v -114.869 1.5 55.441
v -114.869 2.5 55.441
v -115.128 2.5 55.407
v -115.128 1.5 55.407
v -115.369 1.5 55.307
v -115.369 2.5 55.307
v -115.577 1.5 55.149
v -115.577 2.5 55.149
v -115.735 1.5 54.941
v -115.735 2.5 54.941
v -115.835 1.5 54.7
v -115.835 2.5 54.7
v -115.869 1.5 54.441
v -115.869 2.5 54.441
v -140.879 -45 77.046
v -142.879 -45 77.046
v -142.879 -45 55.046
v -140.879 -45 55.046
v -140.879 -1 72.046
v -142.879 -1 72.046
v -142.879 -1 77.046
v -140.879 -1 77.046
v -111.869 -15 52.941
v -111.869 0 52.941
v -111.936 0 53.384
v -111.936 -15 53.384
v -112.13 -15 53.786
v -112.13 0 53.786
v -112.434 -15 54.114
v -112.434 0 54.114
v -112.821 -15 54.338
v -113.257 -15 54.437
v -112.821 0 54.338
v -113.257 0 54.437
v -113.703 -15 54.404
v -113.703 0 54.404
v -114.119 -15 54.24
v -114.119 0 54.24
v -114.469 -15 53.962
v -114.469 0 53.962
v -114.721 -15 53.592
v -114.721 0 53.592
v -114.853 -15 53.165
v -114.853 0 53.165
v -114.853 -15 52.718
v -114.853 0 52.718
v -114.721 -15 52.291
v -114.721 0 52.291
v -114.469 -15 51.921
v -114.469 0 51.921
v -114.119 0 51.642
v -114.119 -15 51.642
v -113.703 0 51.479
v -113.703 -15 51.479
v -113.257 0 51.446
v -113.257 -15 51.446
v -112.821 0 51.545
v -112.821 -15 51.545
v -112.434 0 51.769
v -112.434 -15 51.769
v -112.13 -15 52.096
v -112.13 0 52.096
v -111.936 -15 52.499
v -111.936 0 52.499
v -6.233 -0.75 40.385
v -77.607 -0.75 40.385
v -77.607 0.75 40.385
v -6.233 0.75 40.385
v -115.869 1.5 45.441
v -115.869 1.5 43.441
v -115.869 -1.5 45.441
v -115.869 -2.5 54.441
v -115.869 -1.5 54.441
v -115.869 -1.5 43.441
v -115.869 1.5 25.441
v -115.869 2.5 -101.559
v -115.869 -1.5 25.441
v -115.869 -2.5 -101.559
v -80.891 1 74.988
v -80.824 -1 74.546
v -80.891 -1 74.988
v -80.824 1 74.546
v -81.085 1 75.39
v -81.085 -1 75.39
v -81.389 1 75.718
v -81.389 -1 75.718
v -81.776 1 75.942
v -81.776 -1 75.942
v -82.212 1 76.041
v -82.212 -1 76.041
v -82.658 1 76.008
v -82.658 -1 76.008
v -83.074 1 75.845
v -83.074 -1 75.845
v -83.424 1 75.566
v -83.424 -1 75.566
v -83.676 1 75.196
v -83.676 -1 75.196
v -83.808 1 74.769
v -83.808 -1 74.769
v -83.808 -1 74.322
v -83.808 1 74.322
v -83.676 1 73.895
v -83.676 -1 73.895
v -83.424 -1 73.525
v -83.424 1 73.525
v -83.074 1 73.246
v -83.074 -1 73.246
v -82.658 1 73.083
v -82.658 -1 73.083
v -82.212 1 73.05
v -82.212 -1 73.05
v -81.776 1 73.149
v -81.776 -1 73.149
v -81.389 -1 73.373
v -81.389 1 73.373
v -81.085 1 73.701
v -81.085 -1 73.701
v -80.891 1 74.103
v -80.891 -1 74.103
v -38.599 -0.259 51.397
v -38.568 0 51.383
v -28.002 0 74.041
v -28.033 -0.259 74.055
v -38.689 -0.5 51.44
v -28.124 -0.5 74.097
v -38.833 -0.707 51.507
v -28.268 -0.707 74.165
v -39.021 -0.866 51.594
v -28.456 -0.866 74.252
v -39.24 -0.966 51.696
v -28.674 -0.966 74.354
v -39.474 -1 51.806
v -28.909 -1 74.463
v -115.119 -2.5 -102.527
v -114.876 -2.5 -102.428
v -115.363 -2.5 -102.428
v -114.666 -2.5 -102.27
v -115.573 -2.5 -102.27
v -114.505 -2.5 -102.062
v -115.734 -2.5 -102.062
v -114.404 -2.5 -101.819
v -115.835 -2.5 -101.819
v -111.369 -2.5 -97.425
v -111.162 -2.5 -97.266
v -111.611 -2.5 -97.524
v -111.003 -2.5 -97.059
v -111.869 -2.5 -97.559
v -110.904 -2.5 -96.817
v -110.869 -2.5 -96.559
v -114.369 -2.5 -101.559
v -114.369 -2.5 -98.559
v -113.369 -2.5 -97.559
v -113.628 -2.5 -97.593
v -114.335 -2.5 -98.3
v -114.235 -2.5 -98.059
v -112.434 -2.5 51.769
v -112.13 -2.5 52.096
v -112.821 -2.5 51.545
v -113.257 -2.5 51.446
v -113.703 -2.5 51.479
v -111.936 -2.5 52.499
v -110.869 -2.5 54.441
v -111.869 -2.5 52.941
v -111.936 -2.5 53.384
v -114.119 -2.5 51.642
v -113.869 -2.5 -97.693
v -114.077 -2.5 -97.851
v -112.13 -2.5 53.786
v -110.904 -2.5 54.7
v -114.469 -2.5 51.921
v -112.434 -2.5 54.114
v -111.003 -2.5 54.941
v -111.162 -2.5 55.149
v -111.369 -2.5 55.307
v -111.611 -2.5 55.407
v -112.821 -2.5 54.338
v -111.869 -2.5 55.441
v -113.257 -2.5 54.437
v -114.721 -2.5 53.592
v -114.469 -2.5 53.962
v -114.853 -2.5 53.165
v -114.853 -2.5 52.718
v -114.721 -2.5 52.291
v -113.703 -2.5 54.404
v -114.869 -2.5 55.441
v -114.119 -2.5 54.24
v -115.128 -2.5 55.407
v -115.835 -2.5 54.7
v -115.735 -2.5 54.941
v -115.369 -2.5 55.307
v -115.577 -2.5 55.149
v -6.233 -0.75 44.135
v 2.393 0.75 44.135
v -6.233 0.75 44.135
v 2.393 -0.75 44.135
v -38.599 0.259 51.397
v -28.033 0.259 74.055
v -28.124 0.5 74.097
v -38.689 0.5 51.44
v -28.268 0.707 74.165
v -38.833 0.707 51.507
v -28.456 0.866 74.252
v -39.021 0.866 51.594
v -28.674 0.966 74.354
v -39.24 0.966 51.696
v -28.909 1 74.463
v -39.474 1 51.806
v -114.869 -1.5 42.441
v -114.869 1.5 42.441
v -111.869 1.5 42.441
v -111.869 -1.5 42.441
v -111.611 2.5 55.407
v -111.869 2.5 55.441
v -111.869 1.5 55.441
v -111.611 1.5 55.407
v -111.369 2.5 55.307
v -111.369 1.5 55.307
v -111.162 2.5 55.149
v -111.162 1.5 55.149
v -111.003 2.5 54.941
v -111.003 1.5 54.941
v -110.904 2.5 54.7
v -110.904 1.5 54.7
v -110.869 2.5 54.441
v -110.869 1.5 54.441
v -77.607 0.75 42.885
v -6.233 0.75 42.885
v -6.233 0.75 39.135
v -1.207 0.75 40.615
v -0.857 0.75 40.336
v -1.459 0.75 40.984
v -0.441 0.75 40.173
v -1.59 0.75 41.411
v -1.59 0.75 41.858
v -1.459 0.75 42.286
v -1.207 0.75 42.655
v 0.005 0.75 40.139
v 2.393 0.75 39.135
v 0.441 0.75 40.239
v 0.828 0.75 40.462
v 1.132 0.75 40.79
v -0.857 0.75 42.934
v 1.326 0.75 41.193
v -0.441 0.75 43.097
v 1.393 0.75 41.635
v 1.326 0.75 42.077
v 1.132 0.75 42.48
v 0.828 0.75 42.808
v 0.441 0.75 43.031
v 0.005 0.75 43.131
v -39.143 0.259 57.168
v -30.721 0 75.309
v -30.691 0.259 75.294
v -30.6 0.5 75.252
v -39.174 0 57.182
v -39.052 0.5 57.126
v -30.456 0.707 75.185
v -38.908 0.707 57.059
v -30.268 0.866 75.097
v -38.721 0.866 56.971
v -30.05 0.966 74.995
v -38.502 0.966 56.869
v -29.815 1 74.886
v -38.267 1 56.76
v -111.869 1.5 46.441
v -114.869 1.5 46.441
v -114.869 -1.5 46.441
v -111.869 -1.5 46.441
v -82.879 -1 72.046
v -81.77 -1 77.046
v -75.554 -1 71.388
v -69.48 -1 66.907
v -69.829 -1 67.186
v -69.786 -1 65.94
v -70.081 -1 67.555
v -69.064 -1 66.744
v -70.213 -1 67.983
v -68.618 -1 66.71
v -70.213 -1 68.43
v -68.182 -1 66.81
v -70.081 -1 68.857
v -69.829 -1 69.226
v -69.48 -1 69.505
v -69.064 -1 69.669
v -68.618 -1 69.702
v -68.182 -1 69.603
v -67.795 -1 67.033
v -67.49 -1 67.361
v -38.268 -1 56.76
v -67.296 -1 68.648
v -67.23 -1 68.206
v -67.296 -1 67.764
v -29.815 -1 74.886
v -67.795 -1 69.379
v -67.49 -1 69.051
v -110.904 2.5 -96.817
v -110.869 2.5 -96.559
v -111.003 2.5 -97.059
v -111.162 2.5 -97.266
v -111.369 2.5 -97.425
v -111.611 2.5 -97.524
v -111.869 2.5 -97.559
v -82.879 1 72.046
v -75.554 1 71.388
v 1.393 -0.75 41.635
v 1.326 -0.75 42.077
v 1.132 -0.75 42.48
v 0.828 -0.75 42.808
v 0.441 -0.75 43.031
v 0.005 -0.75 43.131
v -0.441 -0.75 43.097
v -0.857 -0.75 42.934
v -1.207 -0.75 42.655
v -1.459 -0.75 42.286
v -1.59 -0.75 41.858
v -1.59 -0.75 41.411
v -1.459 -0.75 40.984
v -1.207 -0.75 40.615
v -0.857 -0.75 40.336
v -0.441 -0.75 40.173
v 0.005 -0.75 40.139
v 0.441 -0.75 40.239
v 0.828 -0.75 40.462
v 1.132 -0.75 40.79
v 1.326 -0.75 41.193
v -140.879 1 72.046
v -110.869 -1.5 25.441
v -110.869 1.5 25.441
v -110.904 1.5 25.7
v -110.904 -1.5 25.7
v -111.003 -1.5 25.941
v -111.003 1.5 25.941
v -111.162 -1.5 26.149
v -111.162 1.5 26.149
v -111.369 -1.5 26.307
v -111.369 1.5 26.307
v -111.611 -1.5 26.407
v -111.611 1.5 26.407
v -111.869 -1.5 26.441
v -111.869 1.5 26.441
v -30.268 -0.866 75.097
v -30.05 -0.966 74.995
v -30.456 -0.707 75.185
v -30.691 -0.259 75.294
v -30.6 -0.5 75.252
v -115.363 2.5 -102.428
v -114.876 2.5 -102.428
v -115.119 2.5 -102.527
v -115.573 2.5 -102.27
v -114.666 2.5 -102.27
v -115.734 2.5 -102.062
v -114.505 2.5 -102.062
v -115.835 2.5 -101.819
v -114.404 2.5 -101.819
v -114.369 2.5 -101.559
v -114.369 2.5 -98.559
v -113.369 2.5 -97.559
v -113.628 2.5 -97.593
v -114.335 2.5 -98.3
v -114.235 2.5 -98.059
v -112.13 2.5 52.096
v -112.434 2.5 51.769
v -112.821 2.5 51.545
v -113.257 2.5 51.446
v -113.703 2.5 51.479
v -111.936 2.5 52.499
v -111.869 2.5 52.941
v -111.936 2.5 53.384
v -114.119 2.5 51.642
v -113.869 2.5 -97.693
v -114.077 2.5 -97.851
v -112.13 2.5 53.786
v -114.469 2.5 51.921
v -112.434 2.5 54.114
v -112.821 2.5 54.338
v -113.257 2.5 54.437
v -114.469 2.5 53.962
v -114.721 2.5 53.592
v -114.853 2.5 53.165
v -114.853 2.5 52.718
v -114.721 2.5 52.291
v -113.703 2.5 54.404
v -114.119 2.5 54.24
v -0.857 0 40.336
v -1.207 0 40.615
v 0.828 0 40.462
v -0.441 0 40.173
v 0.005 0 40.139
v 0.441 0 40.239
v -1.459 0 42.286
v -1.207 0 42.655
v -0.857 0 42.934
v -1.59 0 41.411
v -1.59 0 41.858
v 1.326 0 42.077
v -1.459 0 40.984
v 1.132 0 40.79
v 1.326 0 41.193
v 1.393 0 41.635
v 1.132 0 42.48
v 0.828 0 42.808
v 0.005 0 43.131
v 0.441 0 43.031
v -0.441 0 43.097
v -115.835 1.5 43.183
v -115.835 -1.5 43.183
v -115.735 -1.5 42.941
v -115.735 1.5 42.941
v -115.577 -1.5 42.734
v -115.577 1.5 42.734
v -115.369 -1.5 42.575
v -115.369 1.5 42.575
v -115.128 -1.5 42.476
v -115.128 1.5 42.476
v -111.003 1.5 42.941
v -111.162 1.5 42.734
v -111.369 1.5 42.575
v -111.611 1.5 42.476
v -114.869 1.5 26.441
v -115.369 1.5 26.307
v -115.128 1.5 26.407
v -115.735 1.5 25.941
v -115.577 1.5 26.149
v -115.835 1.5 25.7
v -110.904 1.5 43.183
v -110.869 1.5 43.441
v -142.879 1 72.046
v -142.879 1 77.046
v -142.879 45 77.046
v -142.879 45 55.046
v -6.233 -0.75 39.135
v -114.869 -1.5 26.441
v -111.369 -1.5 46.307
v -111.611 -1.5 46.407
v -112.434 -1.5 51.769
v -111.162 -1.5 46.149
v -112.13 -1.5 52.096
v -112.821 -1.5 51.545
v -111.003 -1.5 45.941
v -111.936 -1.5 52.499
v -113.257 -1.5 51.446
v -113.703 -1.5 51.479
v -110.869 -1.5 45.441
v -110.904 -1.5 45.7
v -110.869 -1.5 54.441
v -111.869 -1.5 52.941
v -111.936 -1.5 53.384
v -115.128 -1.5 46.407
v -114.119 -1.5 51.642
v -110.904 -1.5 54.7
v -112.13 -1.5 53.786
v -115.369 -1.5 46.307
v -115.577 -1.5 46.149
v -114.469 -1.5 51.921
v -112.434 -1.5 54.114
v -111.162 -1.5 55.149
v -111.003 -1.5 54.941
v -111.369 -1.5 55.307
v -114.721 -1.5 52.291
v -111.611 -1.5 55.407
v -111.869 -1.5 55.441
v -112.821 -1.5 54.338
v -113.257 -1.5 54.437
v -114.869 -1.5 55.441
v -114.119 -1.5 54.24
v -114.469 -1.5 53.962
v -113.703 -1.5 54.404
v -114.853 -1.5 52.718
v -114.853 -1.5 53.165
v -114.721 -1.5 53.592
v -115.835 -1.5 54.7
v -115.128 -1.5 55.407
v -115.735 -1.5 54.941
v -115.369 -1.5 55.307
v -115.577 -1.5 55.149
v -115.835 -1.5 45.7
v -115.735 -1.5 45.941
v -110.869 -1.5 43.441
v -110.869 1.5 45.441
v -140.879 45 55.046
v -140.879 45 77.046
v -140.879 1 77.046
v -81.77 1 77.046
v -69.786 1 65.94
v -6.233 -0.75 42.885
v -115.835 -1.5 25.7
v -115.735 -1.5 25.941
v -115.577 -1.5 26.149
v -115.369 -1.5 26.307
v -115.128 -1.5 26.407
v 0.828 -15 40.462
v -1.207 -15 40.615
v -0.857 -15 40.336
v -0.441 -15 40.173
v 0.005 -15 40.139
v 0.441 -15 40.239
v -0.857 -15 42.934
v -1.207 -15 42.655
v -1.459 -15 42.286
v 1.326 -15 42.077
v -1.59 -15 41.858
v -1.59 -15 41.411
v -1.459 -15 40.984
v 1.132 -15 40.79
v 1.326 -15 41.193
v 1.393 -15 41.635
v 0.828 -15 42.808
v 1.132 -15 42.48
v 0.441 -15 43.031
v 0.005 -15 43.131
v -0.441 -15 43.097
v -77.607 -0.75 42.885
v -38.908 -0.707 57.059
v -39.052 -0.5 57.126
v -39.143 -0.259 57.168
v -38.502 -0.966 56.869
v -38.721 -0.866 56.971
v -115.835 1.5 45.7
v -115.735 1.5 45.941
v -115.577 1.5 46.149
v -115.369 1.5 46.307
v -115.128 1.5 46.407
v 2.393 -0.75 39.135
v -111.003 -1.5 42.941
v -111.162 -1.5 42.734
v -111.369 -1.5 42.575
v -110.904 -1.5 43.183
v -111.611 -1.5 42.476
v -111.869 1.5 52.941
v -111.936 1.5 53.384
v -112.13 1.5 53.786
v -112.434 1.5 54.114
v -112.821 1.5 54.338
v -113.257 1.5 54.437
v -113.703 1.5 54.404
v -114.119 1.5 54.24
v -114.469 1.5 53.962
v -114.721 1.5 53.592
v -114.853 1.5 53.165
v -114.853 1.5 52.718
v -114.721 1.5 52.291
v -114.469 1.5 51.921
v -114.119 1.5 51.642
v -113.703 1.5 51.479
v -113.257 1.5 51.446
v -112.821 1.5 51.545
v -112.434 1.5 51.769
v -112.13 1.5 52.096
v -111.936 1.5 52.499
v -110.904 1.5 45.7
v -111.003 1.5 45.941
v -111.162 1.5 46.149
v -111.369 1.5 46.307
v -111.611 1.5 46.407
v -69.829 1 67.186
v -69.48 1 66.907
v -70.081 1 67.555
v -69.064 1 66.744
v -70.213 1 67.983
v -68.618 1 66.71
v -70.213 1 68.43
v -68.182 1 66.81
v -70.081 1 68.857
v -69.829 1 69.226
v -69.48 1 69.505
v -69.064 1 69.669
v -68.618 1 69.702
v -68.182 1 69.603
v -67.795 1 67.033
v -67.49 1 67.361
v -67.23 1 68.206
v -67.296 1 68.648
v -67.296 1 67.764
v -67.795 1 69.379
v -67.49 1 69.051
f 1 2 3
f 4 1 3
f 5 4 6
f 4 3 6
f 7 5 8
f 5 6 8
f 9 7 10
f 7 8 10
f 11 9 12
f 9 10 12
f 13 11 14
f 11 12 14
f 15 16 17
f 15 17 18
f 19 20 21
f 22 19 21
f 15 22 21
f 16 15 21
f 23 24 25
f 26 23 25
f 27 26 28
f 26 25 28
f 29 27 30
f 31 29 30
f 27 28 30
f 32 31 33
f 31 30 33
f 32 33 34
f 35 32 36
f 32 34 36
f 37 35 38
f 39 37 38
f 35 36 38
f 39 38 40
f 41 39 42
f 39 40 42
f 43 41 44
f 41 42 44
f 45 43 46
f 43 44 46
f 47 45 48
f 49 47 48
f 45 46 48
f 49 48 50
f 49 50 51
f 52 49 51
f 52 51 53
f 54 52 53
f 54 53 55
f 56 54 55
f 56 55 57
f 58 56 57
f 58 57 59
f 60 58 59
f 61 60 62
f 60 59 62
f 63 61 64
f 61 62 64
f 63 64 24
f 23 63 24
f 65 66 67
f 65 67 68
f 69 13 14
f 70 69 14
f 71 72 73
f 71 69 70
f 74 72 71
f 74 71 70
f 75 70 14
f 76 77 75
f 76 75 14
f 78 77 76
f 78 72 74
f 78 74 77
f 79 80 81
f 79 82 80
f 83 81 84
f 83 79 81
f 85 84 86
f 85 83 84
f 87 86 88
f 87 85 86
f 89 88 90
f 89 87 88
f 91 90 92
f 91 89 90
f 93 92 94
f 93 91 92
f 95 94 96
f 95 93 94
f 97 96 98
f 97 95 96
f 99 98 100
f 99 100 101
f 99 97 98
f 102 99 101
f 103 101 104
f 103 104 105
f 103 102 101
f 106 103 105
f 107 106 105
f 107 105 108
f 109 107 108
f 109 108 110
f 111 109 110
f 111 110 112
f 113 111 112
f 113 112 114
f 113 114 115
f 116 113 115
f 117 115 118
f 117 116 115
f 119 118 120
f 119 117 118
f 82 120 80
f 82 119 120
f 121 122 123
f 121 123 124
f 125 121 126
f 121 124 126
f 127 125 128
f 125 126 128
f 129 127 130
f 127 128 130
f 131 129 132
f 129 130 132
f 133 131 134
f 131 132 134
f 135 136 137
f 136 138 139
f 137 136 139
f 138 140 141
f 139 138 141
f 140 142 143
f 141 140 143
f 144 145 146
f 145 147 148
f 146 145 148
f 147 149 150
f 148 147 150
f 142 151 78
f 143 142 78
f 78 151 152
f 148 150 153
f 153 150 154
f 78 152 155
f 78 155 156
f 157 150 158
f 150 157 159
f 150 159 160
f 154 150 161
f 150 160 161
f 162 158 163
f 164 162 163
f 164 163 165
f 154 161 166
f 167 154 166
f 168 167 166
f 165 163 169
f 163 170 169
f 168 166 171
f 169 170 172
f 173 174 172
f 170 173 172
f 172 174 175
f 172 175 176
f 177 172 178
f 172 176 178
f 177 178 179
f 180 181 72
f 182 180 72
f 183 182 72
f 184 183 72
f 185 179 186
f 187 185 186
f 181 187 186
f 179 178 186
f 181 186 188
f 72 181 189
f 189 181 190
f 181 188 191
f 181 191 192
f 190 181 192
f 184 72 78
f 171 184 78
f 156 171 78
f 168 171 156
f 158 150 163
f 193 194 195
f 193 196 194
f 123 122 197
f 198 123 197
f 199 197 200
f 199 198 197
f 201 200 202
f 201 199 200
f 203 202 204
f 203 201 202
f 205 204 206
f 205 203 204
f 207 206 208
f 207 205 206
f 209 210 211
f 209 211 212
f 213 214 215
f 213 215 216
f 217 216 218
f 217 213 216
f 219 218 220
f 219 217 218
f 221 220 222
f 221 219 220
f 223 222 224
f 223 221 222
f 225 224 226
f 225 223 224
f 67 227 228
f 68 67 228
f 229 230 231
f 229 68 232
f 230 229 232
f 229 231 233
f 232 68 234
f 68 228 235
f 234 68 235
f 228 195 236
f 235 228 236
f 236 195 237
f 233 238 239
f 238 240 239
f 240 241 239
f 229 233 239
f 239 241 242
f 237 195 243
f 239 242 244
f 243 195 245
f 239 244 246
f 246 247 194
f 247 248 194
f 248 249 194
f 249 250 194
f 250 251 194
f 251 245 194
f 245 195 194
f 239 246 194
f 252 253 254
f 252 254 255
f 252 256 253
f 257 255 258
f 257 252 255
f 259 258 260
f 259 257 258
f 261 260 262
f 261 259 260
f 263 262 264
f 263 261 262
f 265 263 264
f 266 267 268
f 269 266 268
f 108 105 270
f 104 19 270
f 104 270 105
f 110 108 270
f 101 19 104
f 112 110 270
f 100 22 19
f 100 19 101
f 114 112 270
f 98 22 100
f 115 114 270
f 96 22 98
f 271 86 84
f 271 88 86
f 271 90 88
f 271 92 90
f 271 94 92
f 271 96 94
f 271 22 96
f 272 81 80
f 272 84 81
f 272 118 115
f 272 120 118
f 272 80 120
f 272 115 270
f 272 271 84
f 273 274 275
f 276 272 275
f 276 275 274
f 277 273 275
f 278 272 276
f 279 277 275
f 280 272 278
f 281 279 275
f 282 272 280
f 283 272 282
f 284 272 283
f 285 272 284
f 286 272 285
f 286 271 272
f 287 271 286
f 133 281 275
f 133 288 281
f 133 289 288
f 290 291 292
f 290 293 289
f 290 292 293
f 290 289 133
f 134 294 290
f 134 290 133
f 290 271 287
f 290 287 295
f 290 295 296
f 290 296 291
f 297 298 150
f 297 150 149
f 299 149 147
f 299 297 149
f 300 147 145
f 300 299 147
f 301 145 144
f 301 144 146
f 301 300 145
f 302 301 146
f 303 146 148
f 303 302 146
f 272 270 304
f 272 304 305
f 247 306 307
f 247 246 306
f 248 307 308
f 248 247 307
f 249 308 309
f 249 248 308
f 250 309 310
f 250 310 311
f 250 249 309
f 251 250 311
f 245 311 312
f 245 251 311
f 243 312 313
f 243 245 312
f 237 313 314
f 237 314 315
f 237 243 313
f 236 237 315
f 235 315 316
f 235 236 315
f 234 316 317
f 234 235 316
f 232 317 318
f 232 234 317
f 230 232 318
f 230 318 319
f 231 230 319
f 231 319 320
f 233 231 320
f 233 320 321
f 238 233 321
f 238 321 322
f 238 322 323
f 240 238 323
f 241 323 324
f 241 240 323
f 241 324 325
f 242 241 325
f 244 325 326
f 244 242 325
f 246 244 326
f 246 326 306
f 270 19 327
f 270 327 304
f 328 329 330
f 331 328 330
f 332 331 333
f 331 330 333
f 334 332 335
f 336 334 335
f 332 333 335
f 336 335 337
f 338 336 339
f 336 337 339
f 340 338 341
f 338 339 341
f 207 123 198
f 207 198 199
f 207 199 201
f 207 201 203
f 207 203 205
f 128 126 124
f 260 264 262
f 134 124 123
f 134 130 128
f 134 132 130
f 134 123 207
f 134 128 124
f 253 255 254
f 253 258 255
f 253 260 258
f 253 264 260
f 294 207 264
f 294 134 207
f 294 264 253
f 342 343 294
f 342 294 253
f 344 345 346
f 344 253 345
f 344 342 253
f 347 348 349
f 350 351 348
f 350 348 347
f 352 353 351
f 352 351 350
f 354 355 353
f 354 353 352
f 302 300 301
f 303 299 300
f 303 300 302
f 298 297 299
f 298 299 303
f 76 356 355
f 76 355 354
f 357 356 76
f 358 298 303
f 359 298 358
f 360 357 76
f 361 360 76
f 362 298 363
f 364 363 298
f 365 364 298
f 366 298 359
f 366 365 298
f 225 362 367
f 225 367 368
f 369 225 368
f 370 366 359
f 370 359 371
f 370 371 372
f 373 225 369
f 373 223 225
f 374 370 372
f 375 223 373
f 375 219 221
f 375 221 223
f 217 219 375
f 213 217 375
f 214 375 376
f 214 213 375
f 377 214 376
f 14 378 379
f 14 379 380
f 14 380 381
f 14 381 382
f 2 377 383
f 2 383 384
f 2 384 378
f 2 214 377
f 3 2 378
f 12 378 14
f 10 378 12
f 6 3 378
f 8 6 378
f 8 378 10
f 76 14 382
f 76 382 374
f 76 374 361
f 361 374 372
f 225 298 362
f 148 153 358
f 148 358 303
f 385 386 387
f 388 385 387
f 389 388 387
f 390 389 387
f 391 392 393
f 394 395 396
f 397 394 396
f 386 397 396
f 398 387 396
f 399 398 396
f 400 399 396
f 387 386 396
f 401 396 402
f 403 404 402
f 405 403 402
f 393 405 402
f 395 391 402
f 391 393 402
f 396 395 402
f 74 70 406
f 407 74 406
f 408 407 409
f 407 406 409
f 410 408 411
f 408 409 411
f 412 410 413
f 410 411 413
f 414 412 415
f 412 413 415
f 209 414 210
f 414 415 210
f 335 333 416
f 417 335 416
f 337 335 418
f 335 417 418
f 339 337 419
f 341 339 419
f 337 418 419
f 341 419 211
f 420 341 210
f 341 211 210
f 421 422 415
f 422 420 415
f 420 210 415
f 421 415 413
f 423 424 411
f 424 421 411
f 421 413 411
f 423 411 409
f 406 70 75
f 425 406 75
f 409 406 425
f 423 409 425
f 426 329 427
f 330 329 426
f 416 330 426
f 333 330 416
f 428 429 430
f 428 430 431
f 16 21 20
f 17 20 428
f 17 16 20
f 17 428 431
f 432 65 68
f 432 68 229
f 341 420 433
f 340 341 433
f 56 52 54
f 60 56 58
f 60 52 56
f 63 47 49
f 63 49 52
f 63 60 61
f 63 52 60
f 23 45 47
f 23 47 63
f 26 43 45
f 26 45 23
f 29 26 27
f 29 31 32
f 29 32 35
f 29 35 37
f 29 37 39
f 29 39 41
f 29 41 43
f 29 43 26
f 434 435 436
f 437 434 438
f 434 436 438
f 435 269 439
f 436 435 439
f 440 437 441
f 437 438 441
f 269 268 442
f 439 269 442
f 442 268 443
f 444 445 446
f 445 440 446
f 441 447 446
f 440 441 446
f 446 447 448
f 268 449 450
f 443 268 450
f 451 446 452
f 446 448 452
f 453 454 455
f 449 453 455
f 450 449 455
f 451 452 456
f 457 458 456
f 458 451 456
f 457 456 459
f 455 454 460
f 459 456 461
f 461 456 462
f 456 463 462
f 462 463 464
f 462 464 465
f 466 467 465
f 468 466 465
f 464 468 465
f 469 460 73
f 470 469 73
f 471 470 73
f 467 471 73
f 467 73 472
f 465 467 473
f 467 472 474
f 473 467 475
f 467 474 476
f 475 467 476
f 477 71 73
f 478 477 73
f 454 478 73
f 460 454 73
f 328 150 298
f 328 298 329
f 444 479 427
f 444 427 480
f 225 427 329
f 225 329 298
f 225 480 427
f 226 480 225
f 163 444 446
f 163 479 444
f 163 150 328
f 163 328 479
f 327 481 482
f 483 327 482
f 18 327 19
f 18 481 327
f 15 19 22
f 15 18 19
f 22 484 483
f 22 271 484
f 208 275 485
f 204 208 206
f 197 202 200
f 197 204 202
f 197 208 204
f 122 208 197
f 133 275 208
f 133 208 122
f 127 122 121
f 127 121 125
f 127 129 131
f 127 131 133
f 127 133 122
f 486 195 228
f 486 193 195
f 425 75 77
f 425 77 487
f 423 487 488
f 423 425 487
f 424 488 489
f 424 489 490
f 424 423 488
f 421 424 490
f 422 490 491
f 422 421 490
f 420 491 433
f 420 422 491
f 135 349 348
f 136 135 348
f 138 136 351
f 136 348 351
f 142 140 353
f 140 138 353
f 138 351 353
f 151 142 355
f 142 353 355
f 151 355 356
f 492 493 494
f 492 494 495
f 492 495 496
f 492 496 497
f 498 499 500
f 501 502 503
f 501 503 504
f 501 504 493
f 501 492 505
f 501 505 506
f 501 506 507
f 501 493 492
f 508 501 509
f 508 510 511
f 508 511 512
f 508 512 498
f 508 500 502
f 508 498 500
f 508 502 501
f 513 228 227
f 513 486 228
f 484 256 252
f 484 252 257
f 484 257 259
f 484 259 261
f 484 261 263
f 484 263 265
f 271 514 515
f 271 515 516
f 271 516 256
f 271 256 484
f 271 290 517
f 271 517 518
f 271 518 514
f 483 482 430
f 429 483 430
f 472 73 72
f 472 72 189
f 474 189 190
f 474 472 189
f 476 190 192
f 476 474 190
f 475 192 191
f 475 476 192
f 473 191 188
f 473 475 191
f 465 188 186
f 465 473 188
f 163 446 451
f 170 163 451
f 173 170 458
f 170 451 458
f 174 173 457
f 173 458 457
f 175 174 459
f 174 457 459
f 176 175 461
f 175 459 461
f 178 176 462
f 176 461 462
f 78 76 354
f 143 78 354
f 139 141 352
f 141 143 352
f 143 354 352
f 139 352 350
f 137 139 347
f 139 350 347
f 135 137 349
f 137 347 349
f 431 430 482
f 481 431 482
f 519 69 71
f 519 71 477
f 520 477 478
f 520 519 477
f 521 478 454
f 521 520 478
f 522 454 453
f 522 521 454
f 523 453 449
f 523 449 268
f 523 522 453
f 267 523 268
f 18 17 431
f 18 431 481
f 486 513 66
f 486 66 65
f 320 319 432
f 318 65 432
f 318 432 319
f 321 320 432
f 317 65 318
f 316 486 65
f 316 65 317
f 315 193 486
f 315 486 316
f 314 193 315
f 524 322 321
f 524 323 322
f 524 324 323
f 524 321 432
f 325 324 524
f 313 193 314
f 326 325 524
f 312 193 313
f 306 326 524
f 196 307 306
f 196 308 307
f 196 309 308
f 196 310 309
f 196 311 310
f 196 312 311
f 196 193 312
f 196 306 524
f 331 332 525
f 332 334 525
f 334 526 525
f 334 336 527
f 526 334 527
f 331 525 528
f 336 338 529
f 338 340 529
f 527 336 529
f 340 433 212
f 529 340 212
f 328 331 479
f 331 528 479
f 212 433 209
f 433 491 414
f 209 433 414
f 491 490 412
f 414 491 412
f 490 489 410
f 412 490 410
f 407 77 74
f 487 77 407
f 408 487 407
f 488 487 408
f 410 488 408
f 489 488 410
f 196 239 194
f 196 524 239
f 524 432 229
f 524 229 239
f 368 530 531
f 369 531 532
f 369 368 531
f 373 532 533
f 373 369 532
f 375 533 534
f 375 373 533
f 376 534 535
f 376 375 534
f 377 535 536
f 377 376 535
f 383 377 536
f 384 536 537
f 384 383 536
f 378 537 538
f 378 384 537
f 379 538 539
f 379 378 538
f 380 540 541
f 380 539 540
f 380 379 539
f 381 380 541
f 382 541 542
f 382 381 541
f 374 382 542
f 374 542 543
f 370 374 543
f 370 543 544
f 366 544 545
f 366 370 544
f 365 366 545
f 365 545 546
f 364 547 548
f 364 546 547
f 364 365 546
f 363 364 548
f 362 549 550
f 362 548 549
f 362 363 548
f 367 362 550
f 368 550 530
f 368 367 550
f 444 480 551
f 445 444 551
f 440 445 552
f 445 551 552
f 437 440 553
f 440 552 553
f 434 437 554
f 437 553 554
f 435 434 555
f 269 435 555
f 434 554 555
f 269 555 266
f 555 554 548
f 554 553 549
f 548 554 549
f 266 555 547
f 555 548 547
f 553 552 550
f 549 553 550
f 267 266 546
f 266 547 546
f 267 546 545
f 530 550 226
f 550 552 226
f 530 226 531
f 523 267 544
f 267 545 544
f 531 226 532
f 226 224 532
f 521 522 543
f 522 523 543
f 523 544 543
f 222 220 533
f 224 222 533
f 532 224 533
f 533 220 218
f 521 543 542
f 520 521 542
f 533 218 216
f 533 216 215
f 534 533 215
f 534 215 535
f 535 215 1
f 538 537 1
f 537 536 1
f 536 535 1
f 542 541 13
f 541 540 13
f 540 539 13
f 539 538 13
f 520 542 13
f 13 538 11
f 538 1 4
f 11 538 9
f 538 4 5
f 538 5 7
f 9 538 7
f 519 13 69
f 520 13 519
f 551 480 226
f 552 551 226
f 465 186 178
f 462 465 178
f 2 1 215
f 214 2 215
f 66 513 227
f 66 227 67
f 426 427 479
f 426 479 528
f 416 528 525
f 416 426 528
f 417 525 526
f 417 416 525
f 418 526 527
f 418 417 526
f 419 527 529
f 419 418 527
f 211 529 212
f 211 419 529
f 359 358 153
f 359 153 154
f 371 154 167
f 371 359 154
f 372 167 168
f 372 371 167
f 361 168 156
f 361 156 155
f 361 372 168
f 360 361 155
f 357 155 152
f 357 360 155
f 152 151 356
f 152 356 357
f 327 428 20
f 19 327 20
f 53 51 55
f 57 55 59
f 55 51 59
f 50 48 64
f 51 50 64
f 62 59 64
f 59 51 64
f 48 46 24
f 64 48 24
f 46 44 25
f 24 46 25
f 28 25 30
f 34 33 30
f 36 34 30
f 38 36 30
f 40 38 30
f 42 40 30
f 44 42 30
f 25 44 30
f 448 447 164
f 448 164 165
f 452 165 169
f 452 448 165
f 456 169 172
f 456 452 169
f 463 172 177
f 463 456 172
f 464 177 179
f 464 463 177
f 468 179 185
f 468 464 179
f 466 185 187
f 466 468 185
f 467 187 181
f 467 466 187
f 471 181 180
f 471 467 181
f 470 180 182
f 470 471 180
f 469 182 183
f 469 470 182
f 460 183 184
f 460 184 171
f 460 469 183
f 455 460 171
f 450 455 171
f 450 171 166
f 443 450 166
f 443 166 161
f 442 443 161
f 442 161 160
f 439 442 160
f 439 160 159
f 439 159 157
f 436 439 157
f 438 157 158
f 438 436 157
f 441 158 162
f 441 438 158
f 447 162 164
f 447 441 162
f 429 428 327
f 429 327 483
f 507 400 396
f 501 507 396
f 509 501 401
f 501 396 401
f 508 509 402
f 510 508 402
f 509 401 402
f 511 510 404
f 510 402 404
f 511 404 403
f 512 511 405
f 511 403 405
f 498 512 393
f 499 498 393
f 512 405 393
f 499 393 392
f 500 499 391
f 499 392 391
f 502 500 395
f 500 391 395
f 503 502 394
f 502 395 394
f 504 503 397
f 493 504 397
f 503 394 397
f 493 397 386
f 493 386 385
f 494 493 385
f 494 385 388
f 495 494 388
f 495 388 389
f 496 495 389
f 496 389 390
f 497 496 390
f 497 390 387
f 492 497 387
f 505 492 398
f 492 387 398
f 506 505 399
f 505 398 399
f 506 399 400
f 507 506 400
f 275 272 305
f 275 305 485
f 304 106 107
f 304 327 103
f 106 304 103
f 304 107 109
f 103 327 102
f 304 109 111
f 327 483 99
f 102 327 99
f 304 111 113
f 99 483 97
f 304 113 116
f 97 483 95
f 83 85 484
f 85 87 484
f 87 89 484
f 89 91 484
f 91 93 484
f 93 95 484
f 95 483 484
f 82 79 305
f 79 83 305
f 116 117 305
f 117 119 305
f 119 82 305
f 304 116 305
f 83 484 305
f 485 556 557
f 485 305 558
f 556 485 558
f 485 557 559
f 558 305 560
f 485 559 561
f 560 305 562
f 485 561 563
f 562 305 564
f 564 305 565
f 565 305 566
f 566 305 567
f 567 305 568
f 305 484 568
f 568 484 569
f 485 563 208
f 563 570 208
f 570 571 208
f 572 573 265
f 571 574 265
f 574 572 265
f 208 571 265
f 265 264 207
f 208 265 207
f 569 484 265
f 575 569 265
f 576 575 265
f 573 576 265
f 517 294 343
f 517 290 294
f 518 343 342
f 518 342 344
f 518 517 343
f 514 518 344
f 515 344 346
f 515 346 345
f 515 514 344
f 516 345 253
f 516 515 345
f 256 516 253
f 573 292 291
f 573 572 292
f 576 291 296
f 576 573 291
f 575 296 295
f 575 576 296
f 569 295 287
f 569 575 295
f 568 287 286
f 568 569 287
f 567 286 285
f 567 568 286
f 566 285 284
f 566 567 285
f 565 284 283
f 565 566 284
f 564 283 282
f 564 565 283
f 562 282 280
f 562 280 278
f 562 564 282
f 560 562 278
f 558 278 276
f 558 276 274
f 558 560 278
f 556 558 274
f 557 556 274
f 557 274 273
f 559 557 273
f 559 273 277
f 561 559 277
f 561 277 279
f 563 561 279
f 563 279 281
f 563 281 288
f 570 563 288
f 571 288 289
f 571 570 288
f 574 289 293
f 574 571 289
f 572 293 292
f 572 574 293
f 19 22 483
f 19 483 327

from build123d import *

# Parameters (mm, degrees)
F0_R        = 1.5
F1_DEPTH    = 0.75
F0_W        = 5
F0_H        = 12.5
F0_H_2      = 16
F2_DEPTH    = 2.5
F3_DEPTH    = 1
F4_DEPTH    = 45
F5_W        = 3
F5_H        = 9
F5_H_2      = 16
F6_DEPTH    = 118.2633225451
F7_T1_DEPTH = 5
F7_T3_DEPTH = 6
F7_T5_DEPTH = 6
F7_T7_DEPTH = 10
F7_T9_DEPTH = 3
F7_2_F1_R   = 1
F7_2_F2_R   = 0.9999
F7_2_F3_R   = 1
F7_2_F4_R   = 0.9999
F9_W        = 2
F9_H        = 5
F10_DEPTH   = 25
F11_DEPTH   = 15


# Not quite as in the source:
# - a fillet or chamfer that OpenCascade refuses, or shapes differently, is made with other operations: its cross-section is extruded or revolved along the edge and cut away or added
# - two fillets or chamfers of one size are made in one step
# - a fillet or chamfer is up to 0.001 mm smaller than in the source, because OpenCascade refuses the exact size


with BuildPart() as f1:
    # F0 (on Front) → F1 (new body, symmetric)
    with BuildSketch(Plane.XZ):
        Polygon((-6.2327417545, 42.8849308193), (-77.6071324944, 42.8849308193), (-77.6071324944, 40.3849308193), (-6.2327417545, 40.3849308193), (-6.2327417545, 41.6349308193), align=None)
        Polygon((2.3928675056, 44.1349308193), (-6.2327417545, 44.1349308193), (-6.2327417545, 42.8849308193), (-6.2327417545, 41.6349308193), (-6.2327417545, 40.3849308193), (-6.2327417545, 39.1349308193), (2.3928675056, 39.1349308193), align=None)
        with Locations((-0.1071324944, 41.6349308193)):
            Circle(F0_R, mode=Mode.SUBTRACT)
    extrude(amount=F1_DEPTH, both=True)


with BuildPart() as f2:
    # F0 (on Front) → F2 (new body, symmetric)
    with BuildSketch(Plane.XZ):
        with Locations((-113.3694550395, 49.191441834)):
            Rectangle(F0_W, F0_H)
        with Locations((-113.3694550395, 52.941441834)):
            Circle(F0_R, mode=Mode.SUBTRACT)
        Polygon((-110.8694550395, 26.941441834), (-115.8694550395, 26.941441834), (-115.8694550395, -102.558558166), (-114.3694550395, -102.558558166), (-114.3694550395, -97.558558166), (-112.3694550395, -97.558558166), (-110.8694550395, -97.558558166), align=None)
        with Locations((-113.3694550395, 34.941441834)):
            Rectangle(F0_W, F0_H_2)
    extrude(amount=F2_DEPTH, both=True)

    # F5 (on face) → F6 (cut, through all)
    with BuildSketch(Plane(origin=(-115.8694550395, 0, 0), x_dir=(0, -1, 0), z_dir=(-1, 0, 0))):
        with Locations((0, 50.941441834)):
            Rectangle(F5_W, F5_H)
        with Locations((0, 34.441441834)):
            Rectangle(F5_W, F5_H_2)
    extrude(amount=-F6_DEPTH, mode=Mode.SUBTRACT)

    # F7: fillet of radius 1 on 14 edges, made by hand

    # F7_s2 → F7_t1 (join)
    with BuildSketch(Plane.XZ.offset(-2.5)):
        with BuildLine():
            ThreePointArc((-113.3694550395, -97.558558166), (-114.0765618207, -97.8514513848), (-114.3694550395, -98.558558166))
            Line((-114.3694550395, -98.558558166), (-114.3694550395, -97.558558166))
            Line((-114.3694550395, -97.558558166), (-113.3694550395, -97.558558166))
        make_face()
    extrude(amount=F7_T1_DEPTH)

    # F7_s4 → F7_t3 (cut)
    with BuildSketch(Plane.XZ.offset(-1)):
        with BuildLine():
            ThreePointArc((-110.8694550395, 54.441441834), (-111.1623482583, 55.1485486152), (-111.8694550395, 55.441441834))
            Line((-111.8694550395, 55.441441834), (-110.8694550395, 55.441441834))
            Line((-110.8694550395, 55.441441834), (-110.8694550395, 54.441441834))
        make_face()
        with BuildLine():
            ThreePointArc((-115.8694550395, 54.441441834), (-115.5765618207, 55.1485486152), (-114.8694550395, 55.441441834))
            Line((-114.8694550395, 55.441441834), (-115.8694550395, 55.441441834))
            Line((-115.8694550395, 55.441441834), (-115.8694550395, 54.441441834))
        make_face()
    extrude(amount=F7_T3_DEPTH, mode=Mode.SUBTRACT)

    # F7_s6 → F7_t5 (cut)
    with BuildSketch(Plane.XZ.offset(-5)):
        with BuildLine():
            ThreePointArc((-111.8694550395, 55.441441834), (-111.1623482583, 55.1485486152), (-110.8694550395, 54.441441834))
            Line((-110.8694550395, 54.441441834), (-110.8694550395, 55.441441834))
            Line((-110.8694550395, 55.441441834), (-111.8694550395, 55.441441834))
        make_face()
        with BuildLine():
            ThreePointArc((-114.8694550395, 55.441441834), (-115.5765618207, 55.1485486152), (-115.8694550395, 54.441441834))
            Line((-115.8694550395, 54.441441834), (-115.8694550395, 55.441441834))
            Line((-115.8694550395, 55.441441834), (-114.8694550395, 55.441441834))
        make_face()
    extrude(amount=F7_T5_DEPTH, mode=Mode.SUBTRACT)

    # F7_s8 → F7_t7 (cut)
    with BuildSketch(Plane.XZ.offset(-5)):
        with BuildLine():
            ThreePointArc((-115.3694550395, -102.558558166), (-114.6623482583, -102.2656649472), (-114.3694550395, -101.558558166))
            Line((-114.3694550395, -101.558558166), (-114.3694550395, -102.558558166))
            Line((-114.3694550395, -102.558558166), (-115.3694550395, -102.558558166))
        make_face()
        with BuildLine():
            ThreePointArc((-115.8694550395, -101.558558166), (-115.5765618207, -102.2656649472), (-114.8694550395, -102.558558166))
            Line((-114.8694550395, -102.558558166), (-115.8694550395, -102.558558166))
            Line((-115.8694550395, -102.558558166), (-115.8694550395, -101.558558166))
        make_face()
        with BuildLine():
            ThreePointArc((-110.8694550395, -96.558558166), (-111.1623482583, -97.2656649472), (-111.8694550395, -97.558558166))
            Line((-111.8694550395, -97.558558166), (-110.8694550395, -97.558558166))
            Line((-110.8694550395, -97.558558166), (-110.8694550395, -96.558558166))
        make_face()
    extrude(amount=F7_T7_DEPTH, mode=Mode.SUBTRACT)

    # F7_s10 → F7_t9 (cut)
    with BuildSketch(Plane.XZ.offset(-1.5)):
        with BuildLine():
            ThreePointArc((-110.8694550395, 43.441441834), (-111.1623482583, 42.7343350528), (-111.8694550395, 42.441441834))
            Line((-111.8694550395, 42.441441834), (-110.8694550395, 42.441441834))
            Line((-110.8694550395, 42.441441834), (-110.8694550395, 43.441441834))
        make_face()
        with BuildLine():
            ThreePointArc((-110.8694550395, 25.441441834), (-111.1623482583, 26.1485486152), (-111.8694550395, 26.441441834))
            Line((-111.8694550395, 26.441441834), (-110.8694550395, 26.441441834))
            Line((-110.8694550395, 26.441441834), (-110.8694550395, 25.441441834))
        make_face()
        with BuildLine():
            ThreePointArc((-115.8694550395, 43.441441834), (-115.5765618207, 42.7343350528), (-114.8694550395, 42.441441834))
            Line((-114.8694550395, 42.441441834), (-115.8694550395, 42.441441834))
            Line((-115.8694550395, 42.441441834), (-115.8694550395, 43.441441834))
        make_face()
        with BuildLine():
            ThreePointArc((-115.8694550395, 25.441441834), (-115.5765618207, 26.1485486152), (-114.8694550395, 26.441441834))
            Line((-114.8694550395, 26.441441834), (-115.8694550395, 26.441441834))
            Line((-115.8694550395, 26.441441834), (-115.8694550395, 25.441441834))
        make_face()
        with BuildLine():
            ThreePointArc((-115.8694550395, 45.441441834), (-115.5765618207, 46.1485486152), (-114.8694550395, 46.441441834))
            Line((-114.8694550395, 46.441441834), (-115.8694550395, 46.441441834))
            Line((-115.8694550395, 46.441441834), (-115.8694550395, 45.441441834))
        make_face()
        with BuildLine():
            ThreePointArc((-110.8694550395, 45.441441834), (-111.1623482583, 46.1485486152), (-111.8694550395, 46.441441834))
            Line((-111.8694550395, 46.441441834), (-110.8694550395, 46.441441834))
            Line((-110.8694550395, 46.441441834), (-110.8694550395, 45.441441834))
        make_face()
    extrude(amount=F7_T9_DEPTH, mode=Mode.SUBTRACT)


with BuildPart() as f3:
    # F0 (on Front) → F3 (new body, symmetric)
    with BuildSketch(Plane.XZ):
        Polygon((-81.7702353249, 77.0455077887), (-140.8787086381, 77.0455077887), (-140.8787086381, 72.0455077887), (-82.8787086381, 72.0455077887), (-75.5537198958, 71.3882542396), (-69.7864008303, 65.940464395), (-38.5679372817, 51.3830557664), (-36.454845973, 55.9145947016), (-39.1737693341, 57.1824494868), align=None)
        with Locations((-82.3244719815, 74.5455077887)):
            Circle(F0_R, mode=Mode.SUBTRACT)
        with Locations((-68.7298551759, 68.2062338625)):
            Circle(F0_R, mode=Mode.SUBTRACT)
        Polygon((-30.7214040993, 75.3086052276), (-39.1737693341, 57.1824494868), (-36.454845973, 55.9145947016), (-28.0024807382, 74.0407504424), align=None)
    extrude(amount=F3_DEPTH, both=True)

    # F7#2: fillet of radius 1 on 4 edges, made by hand

    # F7_2_f1
    f7_2_f1_edges = [f3.edges().sort_by_distance(p)[0] for p in [
        (-34.9475867167, 1, 66.2455273572),
    ]]
    fillet(f7_2_f1_edges, radius=F7_2_F1_R)

    # F7_2_f2 (radius 1 in the source; OpenCascade refuses exactly that, so slightly less here)
    f7_2_f2_edges = [f3.edges().sort_by_distance(p)[0] for p in [
        (-34.9475867167, -1, 66.2455273572),
    ]]
    fillet(f7_2_f2_edges, radius=F7_2_F2_R)

    # F7_2_f3
    f7_2_f3_edges = [f3.edges().sort_by_distance(p)[0] for p in [
        (-33.28520901, 1, 62.7119031044),
    ]]
    fillet(f7_2_f3_edges, radius=F7_2_F3_R)

    # F7_2_f4 (radius 1 in the source; OpenCascade refuses exactly that, so slightly less here)
    f7_2_f4_edges = [f3.edges().sort_by_distance(p)[0] for p in [
        (-33.28520901, -1, 62.7119031044),
    ]]
    fillet(f7_2_f4_edges, radius=F7_2_F4_R)


with BuildPart() as f4:
    # F0 (on Front) → F4 (new body, symmetric)
    with BuildSketch(Plane.XZ):
        Polygon((-140.8787086381, 77.0455077887), (-142.8787086381, 77.0455077887), (-142.8787086381, 55.0455077887), (-140.8787086381, 55.0455077887), (-140.8787086381, 72.0455077887), align=None)
    extrude(amount=F4_DEPTH, both=True)

    # F9 (on face) → F10 (cut)
    with BuildSketch(Plane(origin=(-142.8787086381, 0, 0), x_dir=(0, -1, 0), z_dir=(-1, 0, 0))):
        with Locations((0, 74.5455077887)):
            Rectangle(F9_W, F9_H)
    extrude(amount=-F10_DEPTH, mode=Mode.SUBTRACT)


with BuildPart() as f11:
    # F0 (on Front) → F11 (new body)
    with BuildSketch(Plane.XZ):
        with Locations((-113.3694550395, 52.941441834)):
            Circle(F0_R)
    extrude(amount=F11_DEPTH)


with BuildPart() as f11b:
    # F0 (on Front) → F11, piece 2 (new body)
    with BuildSketch(Plane.XZ):
        with Locations((-0.1071324944, 41.6349308193)):
            Circle(F0_R)
    extrude(amount=F11_DEPTH)


solid = Compound([f1.part, f2.part, f3.part, f4.part, f11.part, f11b.part])
